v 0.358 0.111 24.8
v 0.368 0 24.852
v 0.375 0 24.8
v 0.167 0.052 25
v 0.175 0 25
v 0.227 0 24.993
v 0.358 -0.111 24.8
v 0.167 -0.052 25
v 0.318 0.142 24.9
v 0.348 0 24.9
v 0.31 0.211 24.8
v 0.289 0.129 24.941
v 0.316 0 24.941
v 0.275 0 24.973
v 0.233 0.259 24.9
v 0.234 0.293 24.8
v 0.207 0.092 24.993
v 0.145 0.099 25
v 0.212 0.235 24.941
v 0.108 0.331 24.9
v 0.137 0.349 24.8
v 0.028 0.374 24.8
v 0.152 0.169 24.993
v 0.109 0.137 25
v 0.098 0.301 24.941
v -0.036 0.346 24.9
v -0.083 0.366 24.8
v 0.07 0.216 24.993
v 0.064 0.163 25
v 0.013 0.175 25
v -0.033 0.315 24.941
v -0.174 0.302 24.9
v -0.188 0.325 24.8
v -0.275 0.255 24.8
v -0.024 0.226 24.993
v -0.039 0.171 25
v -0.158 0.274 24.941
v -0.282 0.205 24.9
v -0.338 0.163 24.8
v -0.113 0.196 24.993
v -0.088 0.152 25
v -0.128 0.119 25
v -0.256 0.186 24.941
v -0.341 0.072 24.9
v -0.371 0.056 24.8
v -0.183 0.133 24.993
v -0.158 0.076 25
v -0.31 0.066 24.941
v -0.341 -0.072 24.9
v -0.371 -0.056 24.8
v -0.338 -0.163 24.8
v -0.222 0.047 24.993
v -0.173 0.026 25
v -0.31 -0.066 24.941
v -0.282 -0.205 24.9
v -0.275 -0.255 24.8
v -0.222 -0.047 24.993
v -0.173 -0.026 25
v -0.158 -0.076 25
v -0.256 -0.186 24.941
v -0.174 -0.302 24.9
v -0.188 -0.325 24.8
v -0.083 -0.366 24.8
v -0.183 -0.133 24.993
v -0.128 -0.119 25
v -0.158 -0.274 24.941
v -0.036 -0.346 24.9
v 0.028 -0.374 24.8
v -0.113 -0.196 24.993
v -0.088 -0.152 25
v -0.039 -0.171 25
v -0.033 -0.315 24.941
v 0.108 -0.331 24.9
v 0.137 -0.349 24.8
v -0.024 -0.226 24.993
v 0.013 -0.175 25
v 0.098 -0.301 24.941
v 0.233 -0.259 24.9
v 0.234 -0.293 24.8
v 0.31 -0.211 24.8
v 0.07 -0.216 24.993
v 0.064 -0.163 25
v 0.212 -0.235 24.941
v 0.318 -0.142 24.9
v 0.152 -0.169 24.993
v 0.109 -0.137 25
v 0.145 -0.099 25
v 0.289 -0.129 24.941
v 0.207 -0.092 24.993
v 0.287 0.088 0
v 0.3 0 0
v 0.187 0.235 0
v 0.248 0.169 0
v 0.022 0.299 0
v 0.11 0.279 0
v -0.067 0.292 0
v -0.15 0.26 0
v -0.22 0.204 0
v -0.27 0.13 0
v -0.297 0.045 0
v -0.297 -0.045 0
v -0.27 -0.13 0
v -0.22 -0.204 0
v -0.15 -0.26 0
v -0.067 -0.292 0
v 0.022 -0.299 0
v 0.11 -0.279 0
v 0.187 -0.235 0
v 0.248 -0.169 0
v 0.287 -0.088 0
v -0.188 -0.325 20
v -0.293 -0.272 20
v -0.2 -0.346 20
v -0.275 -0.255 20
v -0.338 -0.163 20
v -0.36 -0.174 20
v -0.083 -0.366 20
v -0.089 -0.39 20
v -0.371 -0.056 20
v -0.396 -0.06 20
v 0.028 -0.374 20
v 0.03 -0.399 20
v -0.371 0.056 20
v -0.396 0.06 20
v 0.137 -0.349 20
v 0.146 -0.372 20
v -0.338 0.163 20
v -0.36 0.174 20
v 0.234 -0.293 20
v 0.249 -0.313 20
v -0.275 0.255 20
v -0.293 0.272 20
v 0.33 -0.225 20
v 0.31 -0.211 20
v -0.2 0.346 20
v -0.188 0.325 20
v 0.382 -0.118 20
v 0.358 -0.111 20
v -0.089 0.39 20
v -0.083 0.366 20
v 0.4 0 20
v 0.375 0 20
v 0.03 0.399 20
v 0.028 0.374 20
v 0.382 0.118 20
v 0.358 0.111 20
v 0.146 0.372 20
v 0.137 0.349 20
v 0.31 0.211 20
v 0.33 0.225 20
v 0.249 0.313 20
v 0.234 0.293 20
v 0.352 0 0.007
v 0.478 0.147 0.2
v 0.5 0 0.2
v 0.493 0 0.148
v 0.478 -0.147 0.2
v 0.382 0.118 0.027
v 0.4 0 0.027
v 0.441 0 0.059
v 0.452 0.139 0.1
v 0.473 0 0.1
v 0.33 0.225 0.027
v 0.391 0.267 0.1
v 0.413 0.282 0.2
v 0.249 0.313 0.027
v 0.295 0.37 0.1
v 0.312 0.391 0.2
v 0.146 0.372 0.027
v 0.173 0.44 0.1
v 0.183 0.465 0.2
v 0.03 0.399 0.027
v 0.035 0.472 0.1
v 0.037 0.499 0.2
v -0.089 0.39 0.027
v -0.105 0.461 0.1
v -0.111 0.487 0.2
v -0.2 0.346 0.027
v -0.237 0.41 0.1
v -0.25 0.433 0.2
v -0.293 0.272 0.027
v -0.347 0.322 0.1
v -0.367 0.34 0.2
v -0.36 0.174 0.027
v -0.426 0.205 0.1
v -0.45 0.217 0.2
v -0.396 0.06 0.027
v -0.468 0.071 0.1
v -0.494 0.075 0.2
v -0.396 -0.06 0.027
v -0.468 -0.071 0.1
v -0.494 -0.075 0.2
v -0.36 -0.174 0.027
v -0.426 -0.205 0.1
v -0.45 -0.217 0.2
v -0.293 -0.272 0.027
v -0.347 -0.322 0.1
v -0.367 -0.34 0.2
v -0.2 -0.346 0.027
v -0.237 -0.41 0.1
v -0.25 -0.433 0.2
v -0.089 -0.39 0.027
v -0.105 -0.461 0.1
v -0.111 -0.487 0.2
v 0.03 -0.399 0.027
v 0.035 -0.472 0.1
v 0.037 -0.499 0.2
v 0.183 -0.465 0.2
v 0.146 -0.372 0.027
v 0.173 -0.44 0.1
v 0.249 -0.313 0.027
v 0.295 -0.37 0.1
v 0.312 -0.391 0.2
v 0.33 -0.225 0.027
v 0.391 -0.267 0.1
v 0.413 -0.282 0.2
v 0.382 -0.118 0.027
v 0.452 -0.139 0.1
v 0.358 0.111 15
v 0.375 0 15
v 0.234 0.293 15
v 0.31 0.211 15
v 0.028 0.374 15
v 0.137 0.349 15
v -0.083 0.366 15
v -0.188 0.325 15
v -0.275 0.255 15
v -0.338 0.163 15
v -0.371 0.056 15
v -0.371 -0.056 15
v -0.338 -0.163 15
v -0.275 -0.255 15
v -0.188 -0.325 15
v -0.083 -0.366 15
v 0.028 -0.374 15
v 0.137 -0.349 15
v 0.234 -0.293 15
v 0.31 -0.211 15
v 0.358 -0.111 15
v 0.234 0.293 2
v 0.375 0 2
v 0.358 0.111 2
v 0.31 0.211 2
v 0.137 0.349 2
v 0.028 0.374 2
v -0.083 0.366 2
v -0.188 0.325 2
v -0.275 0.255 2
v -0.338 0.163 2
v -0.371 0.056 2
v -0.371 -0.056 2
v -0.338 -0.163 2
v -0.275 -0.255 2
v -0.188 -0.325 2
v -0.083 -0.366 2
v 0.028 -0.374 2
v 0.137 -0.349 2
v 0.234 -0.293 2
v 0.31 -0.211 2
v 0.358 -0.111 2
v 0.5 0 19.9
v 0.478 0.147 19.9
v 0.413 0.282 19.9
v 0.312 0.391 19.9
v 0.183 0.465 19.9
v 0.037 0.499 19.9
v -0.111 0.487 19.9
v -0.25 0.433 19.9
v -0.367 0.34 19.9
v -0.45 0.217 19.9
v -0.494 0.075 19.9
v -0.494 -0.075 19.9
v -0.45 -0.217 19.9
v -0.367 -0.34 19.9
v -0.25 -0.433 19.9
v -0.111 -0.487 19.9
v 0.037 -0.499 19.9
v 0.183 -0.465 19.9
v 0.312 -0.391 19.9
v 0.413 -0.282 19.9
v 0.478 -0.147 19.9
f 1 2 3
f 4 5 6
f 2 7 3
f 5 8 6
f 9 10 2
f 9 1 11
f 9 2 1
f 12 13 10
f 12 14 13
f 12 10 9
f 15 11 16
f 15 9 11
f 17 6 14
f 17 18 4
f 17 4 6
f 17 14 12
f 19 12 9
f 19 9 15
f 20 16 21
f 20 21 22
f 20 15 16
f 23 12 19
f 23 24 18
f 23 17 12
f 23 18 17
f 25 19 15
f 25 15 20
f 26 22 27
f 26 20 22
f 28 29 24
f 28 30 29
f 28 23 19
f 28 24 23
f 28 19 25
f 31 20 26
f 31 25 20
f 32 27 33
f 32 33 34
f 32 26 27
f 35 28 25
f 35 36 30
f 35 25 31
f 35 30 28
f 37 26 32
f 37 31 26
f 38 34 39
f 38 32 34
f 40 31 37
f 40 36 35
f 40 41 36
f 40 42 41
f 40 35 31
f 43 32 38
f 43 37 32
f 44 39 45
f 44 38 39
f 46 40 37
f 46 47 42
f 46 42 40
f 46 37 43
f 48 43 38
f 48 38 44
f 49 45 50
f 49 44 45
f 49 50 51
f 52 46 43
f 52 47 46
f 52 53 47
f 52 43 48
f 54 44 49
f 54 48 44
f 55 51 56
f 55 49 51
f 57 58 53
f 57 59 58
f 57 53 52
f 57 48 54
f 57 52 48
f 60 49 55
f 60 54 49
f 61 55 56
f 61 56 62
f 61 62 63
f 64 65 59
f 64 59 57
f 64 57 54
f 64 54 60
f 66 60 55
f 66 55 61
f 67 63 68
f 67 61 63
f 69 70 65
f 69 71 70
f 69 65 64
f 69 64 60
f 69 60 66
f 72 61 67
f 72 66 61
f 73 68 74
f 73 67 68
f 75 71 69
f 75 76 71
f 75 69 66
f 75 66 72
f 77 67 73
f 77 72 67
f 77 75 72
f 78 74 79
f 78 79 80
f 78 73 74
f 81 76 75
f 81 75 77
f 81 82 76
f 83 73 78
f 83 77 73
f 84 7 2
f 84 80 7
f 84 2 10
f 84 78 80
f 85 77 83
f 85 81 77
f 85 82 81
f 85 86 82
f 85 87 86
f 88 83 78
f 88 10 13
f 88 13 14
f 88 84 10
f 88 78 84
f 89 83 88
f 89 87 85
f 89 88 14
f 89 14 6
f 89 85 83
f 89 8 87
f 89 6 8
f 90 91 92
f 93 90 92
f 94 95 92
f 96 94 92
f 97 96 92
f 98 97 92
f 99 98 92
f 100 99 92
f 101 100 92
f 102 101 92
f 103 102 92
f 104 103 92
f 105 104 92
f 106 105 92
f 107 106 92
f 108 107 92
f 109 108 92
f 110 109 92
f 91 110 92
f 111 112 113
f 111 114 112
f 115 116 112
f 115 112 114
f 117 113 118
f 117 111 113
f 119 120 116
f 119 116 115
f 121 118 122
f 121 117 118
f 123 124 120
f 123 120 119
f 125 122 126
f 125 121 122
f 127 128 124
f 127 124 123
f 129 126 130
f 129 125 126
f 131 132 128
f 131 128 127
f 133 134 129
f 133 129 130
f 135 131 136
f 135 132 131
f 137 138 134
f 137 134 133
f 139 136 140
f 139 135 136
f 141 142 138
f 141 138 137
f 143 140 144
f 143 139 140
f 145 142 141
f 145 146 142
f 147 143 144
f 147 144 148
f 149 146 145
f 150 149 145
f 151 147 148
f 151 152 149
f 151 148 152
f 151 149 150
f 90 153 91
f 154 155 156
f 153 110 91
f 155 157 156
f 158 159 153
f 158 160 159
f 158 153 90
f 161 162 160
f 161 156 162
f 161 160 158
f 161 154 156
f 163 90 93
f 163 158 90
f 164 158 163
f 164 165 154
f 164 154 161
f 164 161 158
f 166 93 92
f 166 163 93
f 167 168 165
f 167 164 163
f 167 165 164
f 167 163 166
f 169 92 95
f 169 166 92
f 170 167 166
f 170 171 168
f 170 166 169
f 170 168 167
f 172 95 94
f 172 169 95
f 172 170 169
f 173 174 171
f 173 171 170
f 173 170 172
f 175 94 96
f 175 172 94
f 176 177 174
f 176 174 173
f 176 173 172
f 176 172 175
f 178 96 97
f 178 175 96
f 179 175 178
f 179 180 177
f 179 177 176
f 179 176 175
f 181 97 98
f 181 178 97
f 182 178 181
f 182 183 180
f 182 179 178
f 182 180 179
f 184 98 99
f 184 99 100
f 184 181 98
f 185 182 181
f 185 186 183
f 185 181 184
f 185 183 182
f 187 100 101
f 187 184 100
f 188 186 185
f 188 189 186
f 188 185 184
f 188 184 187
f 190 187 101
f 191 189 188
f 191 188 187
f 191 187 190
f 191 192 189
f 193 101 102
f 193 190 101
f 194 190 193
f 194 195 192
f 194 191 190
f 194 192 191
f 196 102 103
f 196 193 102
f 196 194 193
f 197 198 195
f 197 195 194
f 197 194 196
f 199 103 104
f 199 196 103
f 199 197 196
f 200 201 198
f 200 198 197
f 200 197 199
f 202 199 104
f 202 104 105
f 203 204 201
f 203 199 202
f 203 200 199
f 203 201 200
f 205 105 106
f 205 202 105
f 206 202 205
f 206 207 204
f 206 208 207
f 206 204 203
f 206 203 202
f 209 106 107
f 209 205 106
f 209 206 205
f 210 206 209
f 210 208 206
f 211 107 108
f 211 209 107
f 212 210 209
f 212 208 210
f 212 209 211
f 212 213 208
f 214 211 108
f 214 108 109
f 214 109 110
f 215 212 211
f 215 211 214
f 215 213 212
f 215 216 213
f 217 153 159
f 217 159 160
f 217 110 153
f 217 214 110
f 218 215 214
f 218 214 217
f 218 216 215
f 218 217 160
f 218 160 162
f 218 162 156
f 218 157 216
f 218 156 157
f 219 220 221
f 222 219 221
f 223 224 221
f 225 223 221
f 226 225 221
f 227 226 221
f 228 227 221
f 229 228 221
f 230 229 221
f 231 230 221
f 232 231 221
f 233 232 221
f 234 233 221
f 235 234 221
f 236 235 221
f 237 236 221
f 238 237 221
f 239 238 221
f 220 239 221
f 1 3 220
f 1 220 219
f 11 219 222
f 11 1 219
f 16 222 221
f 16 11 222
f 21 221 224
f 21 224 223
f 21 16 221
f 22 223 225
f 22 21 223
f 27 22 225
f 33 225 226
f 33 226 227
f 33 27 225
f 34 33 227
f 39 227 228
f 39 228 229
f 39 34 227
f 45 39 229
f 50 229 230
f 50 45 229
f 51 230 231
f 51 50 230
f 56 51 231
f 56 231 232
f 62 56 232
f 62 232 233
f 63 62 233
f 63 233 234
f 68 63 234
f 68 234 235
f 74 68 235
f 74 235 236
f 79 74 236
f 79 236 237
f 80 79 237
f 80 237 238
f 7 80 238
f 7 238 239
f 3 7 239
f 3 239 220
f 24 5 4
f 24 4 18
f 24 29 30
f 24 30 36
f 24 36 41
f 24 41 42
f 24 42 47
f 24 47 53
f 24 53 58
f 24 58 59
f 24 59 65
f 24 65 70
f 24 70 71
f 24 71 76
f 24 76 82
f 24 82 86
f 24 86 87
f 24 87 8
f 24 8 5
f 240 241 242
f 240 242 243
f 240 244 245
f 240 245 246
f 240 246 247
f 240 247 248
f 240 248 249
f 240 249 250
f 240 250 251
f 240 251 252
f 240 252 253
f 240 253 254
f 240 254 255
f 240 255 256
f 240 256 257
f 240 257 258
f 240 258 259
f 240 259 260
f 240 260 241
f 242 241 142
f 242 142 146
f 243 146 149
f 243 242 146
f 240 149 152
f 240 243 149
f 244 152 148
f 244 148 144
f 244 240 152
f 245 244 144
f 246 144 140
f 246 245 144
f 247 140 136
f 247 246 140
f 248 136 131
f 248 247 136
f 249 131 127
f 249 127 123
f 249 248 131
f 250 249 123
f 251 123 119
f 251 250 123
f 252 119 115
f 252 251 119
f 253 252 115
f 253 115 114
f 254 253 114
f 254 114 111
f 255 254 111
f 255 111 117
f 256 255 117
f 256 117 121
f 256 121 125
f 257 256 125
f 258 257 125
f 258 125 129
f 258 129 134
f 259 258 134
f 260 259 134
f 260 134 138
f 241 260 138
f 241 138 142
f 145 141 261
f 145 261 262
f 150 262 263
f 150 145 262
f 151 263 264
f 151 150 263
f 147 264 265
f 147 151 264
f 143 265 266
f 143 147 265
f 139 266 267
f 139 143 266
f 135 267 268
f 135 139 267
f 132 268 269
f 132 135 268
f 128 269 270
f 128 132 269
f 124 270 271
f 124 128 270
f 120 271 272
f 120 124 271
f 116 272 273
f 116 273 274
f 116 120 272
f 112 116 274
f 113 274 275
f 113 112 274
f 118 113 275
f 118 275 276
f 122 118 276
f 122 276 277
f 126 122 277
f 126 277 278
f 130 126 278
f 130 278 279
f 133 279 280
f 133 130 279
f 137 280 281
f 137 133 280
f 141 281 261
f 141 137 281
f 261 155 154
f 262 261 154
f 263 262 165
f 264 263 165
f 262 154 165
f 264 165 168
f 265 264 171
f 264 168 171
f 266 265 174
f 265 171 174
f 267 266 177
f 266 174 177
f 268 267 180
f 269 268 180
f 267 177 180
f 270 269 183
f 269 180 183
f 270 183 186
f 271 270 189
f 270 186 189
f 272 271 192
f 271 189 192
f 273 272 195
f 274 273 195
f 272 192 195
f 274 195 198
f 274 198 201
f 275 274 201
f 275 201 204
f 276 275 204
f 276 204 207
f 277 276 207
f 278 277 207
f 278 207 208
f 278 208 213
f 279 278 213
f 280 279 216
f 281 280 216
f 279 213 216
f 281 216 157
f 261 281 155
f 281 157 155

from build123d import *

# Parameters (mm, degrees)
F0_R     = 0.5
F0_R_2   = 0.375
F1_DEPTH = 20
F2_R     = 0.375
F3_DEPTH = 5
F4_R     = 0.2
F5_SIZE  = 0.1
F6_DEPTH = 2
F7_R     = 0.2


with BuildPart() as f1:
    # F0 (on Top) → F1 (new body)
    with BuildSketch(Plane.XY):
        Circle(F0_R)
        Circle(F0_R_2, mode=Mode.SUBTRACT)
    extrude(amount=F1_DEPTH)

    # F5
    f5_edges = [f1.edges().sort_by_distance(p)[0] for p in [
        (-0.5, 0, 20),
    ]]
    chamfer(f5_edges, length=F5_SIZE)

    # F0 (on Top) → F6 (join)
    with BuildSketch(Plane.XY):
        Circle(F0_R_2)
    extrude(amount=F6_DEPTH)

    # F7
    f7_edges = [f1.edges().sort_by_distance(p)[0] for p in [
        (-0.5, 0, 0),
    ]]
    fillet(f7_edges, radius=F7_R)


with BuildPart() as f3:
    # F2 (on face) → F3 (new body, symmetric)
    with BuildSketch(Plane.XY.offset(20)):
        Circle(F2_R)
    extrude(amount=F3_DEPTH, both=True)

    # F4
    f4_edges = [f3.edges().sort_by_distance(p)[0] for p in [
        (-0.375, 0, 25),
    ]]
    fillet(f4_edges, radius=F4_R)


solid = Compound([f1.part, f3.part])
